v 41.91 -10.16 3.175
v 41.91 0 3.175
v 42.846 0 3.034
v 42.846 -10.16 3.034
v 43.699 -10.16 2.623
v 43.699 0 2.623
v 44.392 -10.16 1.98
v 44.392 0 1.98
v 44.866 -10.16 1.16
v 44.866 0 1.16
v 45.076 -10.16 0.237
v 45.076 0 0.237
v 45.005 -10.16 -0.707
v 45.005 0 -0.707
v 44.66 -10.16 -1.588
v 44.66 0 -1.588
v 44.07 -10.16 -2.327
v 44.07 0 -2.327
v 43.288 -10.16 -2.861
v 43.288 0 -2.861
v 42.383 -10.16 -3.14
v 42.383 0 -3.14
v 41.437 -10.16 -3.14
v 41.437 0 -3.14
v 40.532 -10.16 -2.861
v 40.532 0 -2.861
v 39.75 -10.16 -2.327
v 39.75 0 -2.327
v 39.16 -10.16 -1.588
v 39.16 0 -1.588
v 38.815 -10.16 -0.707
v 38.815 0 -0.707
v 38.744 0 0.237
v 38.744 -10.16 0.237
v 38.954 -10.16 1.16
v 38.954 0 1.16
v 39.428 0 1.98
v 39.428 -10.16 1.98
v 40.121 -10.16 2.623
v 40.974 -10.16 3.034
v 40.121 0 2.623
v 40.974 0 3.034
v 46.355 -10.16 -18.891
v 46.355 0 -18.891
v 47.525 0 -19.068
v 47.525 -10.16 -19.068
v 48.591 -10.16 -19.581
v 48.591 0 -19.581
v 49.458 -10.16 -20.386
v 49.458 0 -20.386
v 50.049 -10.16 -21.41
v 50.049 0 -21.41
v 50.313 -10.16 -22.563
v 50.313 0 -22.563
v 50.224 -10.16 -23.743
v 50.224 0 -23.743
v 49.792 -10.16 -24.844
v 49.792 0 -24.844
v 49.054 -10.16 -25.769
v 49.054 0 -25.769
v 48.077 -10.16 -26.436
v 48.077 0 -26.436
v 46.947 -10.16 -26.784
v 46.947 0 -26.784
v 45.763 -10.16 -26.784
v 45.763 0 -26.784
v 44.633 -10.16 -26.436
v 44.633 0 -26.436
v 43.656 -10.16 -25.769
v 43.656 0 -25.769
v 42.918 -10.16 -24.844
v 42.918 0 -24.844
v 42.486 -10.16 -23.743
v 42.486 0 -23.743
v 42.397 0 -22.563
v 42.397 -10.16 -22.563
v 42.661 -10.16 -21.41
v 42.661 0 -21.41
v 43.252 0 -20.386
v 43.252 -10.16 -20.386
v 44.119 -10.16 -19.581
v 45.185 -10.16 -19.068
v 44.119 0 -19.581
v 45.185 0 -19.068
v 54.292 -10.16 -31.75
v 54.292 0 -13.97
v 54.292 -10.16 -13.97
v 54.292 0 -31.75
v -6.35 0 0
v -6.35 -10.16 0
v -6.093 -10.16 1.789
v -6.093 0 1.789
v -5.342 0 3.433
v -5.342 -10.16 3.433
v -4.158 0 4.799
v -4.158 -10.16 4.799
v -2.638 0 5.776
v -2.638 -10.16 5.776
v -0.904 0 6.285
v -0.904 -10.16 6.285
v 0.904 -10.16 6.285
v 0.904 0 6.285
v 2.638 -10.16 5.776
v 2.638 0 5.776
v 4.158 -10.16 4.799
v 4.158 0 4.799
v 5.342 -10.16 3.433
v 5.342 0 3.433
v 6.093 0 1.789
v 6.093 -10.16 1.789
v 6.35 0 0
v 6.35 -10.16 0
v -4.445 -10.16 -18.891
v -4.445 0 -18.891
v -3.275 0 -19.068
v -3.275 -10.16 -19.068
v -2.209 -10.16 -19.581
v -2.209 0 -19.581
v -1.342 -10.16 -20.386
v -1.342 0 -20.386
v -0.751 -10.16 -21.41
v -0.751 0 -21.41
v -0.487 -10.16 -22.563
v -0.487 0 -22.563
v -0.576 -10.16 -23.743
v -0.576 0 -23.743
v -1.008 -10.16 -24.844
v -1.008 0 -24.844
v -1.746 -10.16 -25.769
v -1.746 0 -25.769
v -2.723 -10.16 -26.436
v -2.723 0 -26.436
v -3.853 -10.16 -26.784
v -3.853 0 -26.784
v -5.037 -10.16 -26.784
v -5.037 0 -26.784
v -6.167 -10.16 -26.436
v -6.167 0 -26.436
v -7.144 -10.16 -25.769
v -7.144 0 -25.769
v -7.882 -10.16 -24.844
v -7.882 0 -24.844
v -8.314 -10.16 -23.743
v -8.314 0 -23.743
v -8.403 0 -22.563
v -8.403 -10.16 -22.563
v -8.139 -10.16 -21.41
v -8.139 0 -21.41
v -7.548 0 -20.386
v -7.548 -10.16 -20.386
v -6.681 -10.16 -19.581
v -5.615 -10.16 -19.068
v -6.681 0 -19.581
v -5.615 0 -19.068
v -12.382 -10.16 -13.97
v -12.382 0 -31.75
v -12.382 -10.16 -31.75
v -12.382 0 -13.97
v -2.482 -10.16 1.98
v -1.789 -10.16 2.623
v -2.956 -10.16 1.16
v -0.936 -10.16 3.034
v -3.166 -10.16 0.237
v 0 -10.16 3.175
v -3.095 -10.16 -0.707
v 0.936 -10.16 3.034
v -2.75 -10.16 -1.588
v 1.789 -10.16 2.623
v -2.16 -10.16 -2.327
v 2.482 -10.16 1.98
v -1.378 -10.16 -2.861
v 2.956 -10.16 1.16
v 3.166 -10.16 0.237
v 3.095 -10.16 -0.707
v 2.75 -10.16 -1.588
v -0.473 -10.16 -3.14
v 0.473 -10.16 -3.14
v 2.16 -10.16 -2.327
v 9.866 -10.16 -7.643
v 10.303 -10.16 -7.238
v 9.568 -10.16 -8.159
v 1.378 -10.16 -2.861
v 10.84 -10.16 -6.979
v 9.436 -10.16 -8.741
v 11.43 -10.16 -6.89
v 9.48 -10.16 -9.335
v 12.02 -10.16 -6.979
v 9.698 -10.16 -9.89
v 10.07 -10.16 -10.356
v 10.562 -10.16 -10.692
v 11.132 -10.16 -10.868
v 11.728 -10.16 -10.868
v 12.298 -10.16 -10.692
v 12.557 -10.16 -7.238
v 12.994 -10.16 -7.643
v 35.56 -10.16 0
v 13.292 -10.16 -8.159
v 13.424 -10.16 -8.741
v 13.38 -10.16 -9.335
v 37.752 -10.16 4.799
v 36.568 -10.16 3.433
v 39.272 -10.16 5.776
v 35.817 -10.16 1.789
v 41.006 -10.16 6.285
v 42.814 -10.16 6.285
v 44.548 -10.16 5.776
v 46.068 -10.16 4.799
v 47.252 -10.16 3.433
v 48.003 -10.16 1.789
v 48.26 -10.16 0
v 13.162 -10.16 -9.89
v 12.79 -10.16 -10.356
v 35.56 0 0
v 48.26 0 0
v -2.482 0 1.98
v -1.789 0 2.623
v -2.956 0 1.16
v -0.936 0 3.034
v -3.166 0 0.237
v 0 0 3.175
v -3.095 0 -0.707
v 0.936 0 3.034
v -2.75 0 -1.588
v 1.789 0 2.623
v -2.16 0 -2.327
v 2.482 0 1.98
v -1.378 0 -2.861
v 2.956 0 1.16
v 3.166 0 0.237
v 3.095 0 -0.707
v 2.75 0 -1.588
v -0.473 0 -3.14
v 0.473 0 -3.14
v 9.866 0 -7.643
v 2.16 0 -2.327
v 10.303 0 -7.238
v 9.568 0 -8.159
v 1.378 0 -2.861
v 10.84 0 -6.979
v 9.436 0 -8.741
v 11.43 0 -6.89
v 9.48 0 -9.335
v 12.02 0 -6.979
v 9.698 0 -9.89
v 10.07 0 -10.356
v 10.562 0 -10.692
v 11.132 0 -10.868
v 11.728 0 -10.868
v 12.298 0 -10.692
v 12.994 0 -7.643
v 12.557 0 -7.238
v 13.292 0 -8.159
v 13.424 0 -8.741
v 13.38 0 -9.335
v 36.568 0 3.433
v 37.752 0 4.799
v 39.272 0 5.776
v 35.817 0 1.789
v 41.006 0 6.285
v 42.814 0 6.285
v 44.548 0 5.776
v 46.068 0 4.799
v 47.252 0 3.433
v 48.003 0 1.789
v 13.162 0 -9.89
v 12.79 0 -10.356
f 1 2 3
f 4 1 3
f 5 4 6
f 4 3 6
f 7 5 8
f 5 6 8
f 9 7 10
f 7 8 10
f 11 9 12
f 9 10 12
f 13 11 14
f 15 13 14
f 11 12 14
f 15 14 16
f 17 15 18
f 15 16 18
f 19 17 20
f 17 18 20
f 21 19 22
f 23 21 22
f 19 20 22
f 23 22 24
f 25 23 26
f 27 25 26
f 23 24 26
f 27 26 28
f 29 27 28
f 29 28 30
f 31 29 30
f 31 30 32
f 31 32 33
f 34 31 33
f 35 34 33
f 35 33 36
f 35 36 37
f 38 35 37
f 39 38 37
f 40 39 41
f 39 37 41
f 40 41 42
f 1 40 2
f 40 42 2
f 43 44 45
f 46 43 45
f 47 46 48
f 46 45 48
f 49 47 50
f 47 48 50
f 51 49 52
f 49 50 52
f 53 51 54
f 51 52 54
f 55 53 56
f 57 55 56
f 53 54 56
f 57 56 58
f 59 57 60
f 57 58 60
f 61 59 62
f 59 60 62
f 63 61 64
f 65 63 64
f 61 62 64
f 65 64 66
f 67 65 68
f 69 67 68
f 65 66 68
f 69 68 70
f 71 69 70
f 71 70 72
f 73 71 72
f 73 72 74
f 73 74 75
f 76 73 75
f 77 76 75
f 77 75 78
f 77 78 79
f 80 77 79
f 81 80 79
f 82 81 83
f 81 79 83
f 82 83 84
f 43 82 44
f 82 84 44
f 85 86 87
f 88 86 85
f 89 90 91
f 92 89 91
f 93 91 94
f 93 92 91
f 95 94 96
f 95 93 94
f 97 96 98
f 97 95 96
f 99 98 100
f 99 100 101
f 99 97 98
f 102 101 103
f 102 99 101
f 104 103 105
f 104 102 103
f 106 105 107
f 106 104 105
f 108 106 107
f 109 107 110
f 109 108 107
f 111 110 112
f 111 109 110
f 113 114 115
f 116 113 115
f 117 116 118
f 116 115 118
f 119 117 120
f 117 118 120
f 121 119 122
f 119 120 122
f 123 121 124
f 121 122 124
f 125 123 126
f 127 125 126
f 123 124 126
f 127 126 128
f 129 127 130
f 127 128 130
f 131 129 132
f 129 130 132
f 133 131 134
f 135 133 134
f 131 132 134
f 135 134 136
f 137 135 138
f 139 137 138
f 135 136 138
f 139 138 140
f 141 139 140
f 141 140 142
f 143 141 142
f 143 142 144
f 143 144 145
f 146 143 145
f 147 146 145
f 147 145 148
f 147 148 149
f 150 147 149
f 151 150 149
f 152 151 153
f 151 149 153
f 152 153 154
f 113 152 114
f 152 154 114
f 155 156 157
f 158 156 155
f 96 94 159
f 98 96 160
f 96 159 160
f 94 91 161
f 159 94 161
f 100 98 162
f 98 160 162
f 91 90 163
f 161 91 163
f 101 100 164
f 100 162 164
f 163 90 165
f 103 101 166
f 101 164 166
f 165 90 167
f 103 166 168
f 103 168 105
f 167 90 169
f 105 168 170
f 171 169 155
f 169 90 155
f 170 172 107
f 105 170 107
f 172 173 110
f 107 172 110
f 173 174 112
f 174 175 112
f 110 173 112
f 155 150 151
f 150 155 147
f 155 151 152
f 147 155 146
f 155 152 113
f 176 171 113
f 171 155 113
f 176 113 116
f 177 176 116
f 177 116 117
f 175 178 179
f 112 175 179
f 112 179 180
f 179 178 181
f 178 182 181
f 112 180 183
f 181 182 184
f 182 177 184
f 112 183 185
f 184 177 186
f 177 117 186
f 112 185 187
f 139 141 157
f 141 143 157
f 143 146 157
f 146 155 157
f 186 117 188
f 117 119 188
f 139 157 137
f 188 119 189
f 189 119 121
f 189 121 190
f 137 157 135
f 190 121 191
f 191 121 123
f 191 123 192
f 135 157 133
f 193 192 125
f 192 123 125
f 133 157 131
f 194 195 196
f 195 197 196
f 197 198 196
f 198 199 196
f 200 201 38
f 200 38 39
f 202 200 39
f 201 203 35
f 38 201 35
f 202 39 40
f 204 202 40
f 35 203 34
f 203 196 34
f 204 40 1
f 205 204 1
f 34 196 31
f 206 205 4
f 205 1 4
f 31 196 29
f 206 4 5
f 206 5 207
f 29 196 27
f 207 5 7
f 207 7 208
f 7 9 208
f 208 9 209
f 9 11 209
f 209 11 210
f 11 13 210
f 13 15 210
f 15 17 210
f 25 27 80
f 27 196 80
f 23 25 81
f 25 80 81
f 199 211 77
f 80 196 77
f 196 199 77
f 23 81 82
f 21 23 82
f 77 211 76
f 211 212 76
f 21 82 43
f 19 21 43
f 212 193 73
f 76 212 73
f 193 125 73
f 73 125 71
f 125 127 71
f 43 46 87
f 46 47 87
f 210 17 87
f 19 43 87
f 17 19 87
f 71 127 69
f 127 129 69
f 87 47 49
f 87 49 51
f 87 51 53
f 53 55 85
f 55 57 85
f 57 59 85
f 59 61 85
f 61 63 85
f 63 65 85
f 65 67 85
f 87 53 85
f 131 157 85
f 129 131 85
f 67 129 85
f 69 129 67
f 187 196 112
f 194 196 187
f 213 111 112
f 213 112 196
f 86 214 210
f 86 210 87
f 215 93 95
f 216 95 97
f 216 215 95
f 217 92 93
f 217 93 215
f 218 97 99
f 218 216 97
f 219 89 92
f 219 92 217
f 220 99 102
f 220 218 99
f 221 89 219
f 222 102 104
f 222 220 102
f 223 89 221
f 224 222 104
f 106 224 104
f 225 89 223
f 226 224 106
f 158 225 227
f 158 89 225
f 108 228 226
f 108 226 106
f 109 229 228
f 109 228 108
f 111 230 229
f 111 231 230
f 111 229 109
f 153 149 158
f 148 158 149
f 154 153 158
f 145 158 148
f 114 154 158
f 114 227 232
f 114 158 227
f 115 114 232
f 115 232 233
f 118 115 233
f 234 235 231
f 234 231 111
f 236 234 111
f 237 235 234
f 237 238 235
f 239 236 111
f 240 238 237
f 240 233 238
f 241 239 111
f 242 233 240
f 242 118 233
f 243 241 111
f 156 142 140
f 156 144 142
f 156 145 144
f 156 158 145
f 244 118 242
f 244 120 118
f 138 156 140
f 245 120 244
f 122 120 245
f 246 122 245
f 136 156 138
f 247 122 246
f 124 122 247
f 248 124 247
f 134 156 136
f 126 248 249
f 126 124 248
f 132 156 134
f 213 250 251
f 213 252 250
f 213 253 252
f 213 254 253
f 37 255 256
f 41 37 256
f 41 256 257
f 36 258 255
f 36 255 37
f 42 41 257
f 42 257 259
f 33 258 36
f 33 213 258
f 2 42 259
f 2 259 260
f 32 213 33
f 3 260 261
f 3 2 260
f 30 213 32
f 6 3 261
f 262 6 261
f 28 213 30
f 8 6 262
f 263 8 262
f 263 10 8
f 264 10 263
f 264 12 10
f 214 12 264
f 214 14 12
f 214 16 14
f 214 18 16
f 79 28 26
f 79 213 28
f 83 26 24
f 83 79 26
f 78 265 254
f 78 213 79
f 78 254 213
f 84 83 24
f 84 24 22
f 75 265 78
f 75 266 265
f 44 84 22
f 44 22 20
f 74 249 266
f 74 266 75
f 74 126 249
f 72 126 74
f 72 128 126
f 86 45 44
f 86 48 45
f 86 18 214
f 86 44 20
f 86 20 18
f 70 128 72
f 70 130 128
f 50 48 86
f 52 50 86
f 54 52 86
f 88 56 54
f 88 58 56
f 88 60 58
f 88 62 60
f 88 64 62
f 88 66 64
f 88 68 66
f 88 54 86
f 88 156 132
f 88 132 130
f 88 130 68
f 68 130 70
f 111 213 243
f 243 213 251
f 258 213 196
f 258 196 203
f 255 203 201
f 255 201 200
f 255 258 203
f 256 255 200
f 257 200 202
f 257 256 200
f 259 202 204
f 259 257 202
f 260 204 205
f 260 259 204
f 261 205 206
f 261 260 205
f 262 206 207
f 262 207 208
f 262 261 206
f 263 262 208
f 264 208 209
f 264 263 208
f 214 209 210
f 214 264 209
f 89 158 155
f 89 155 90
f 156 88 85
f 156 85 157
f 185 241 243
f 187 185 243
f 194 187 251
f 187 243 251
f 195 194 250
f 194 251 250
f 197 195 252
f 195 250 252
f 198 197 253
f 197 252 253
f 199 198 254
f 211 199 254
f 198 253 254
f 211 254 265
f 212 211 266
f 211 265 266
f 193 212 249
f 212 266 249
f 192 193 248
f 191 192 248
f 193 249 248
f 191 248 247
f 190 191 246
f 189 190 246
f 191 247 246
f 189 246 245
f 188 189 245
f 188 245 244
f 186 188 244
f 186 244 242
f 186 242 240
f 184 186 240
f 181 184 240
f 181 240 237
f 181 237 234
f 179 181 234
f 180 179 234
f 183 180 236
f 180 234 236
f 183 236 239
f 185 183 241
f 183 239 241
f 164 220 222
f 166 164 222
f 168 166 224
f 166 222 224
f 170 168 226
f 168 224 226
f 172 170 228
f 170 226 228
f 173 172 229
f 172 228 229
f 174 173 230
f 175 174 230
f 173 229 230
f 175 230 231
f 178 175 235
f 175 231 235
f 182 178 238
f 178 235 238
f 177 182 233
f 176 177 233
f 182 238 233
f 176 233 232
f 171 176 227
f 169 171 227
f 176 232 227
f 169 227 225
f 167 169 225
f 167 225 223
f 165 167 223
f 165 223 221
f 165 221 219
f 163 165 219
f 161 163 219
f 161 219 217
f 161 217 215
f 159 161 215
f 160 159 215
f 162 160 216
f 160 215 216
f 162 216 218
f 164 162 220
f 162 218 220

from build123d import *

# Parameters (mm, degrees)
SKETCH1_R           = 3.175
SKETCH1_R_2         = 3.96875
SKETCH1_R_3         = 2
BOSS_EXTRUDE1_DEPTH = 10.16


with BuildPart() as part:
    # Sketch1 → Boss-Extrude1 (new body)
    with BuildSketch(Plane(origin=(0, 0, 0), x_dir=(1, 0, 0), z_dir=(0, 1, 0))):
        with BuildLine():
            Line((54.2925, 31.75), (-12.3825, 31.75))
            Line((-12.3825, 31.75), (-12.3825, 13.97))
            Line((-12.3825, 13.97), (-6.35, 0))
            ThreePointArc((-6.35, 0), (0, -6.35), (6.35, 0))
            Line((6.35, 0), (35.56, 0))
            ThreePointArc((35.56, 0), (41.91, -6.35), (48.26, 0))
            Line((48.26, 0), (54.2925, 13.97))
            Line((54.2925, 13.97), (54.2925, 31.75))
        make_face()
        with Locations(Location((0, 0, 0), (0, 0, 270))):
            Circle(SKETCH1_R, mode=Mode.SUBTRACT)
        with Locations(Location((41.91, 0, 0), (0, 0, 270))):
            Circle(SKETCH1_R, mode=Mode.SUBTRACT)
        with Locations(Location((46.355, 22.86, 0), (0, 0, 270))):
            Circle(SKETCH1_R_2, mode=Mode.SUBTRACT)
        with Locations(Location((-4.445, 22.86, 0), (0, 0, 270))):
            Circle(SKETCH1_R_2, mode=Mode.SUBTRACT)
        with Locations(Location((11.43, 8.89, 0), (0, 0, 270))):
            Circle(SKETCH1_R_3, mode=Mode.SUBTRACT)
    extrude(amount=-BOSS_EXTRUDE1_DEPTH)


solid = part.part
